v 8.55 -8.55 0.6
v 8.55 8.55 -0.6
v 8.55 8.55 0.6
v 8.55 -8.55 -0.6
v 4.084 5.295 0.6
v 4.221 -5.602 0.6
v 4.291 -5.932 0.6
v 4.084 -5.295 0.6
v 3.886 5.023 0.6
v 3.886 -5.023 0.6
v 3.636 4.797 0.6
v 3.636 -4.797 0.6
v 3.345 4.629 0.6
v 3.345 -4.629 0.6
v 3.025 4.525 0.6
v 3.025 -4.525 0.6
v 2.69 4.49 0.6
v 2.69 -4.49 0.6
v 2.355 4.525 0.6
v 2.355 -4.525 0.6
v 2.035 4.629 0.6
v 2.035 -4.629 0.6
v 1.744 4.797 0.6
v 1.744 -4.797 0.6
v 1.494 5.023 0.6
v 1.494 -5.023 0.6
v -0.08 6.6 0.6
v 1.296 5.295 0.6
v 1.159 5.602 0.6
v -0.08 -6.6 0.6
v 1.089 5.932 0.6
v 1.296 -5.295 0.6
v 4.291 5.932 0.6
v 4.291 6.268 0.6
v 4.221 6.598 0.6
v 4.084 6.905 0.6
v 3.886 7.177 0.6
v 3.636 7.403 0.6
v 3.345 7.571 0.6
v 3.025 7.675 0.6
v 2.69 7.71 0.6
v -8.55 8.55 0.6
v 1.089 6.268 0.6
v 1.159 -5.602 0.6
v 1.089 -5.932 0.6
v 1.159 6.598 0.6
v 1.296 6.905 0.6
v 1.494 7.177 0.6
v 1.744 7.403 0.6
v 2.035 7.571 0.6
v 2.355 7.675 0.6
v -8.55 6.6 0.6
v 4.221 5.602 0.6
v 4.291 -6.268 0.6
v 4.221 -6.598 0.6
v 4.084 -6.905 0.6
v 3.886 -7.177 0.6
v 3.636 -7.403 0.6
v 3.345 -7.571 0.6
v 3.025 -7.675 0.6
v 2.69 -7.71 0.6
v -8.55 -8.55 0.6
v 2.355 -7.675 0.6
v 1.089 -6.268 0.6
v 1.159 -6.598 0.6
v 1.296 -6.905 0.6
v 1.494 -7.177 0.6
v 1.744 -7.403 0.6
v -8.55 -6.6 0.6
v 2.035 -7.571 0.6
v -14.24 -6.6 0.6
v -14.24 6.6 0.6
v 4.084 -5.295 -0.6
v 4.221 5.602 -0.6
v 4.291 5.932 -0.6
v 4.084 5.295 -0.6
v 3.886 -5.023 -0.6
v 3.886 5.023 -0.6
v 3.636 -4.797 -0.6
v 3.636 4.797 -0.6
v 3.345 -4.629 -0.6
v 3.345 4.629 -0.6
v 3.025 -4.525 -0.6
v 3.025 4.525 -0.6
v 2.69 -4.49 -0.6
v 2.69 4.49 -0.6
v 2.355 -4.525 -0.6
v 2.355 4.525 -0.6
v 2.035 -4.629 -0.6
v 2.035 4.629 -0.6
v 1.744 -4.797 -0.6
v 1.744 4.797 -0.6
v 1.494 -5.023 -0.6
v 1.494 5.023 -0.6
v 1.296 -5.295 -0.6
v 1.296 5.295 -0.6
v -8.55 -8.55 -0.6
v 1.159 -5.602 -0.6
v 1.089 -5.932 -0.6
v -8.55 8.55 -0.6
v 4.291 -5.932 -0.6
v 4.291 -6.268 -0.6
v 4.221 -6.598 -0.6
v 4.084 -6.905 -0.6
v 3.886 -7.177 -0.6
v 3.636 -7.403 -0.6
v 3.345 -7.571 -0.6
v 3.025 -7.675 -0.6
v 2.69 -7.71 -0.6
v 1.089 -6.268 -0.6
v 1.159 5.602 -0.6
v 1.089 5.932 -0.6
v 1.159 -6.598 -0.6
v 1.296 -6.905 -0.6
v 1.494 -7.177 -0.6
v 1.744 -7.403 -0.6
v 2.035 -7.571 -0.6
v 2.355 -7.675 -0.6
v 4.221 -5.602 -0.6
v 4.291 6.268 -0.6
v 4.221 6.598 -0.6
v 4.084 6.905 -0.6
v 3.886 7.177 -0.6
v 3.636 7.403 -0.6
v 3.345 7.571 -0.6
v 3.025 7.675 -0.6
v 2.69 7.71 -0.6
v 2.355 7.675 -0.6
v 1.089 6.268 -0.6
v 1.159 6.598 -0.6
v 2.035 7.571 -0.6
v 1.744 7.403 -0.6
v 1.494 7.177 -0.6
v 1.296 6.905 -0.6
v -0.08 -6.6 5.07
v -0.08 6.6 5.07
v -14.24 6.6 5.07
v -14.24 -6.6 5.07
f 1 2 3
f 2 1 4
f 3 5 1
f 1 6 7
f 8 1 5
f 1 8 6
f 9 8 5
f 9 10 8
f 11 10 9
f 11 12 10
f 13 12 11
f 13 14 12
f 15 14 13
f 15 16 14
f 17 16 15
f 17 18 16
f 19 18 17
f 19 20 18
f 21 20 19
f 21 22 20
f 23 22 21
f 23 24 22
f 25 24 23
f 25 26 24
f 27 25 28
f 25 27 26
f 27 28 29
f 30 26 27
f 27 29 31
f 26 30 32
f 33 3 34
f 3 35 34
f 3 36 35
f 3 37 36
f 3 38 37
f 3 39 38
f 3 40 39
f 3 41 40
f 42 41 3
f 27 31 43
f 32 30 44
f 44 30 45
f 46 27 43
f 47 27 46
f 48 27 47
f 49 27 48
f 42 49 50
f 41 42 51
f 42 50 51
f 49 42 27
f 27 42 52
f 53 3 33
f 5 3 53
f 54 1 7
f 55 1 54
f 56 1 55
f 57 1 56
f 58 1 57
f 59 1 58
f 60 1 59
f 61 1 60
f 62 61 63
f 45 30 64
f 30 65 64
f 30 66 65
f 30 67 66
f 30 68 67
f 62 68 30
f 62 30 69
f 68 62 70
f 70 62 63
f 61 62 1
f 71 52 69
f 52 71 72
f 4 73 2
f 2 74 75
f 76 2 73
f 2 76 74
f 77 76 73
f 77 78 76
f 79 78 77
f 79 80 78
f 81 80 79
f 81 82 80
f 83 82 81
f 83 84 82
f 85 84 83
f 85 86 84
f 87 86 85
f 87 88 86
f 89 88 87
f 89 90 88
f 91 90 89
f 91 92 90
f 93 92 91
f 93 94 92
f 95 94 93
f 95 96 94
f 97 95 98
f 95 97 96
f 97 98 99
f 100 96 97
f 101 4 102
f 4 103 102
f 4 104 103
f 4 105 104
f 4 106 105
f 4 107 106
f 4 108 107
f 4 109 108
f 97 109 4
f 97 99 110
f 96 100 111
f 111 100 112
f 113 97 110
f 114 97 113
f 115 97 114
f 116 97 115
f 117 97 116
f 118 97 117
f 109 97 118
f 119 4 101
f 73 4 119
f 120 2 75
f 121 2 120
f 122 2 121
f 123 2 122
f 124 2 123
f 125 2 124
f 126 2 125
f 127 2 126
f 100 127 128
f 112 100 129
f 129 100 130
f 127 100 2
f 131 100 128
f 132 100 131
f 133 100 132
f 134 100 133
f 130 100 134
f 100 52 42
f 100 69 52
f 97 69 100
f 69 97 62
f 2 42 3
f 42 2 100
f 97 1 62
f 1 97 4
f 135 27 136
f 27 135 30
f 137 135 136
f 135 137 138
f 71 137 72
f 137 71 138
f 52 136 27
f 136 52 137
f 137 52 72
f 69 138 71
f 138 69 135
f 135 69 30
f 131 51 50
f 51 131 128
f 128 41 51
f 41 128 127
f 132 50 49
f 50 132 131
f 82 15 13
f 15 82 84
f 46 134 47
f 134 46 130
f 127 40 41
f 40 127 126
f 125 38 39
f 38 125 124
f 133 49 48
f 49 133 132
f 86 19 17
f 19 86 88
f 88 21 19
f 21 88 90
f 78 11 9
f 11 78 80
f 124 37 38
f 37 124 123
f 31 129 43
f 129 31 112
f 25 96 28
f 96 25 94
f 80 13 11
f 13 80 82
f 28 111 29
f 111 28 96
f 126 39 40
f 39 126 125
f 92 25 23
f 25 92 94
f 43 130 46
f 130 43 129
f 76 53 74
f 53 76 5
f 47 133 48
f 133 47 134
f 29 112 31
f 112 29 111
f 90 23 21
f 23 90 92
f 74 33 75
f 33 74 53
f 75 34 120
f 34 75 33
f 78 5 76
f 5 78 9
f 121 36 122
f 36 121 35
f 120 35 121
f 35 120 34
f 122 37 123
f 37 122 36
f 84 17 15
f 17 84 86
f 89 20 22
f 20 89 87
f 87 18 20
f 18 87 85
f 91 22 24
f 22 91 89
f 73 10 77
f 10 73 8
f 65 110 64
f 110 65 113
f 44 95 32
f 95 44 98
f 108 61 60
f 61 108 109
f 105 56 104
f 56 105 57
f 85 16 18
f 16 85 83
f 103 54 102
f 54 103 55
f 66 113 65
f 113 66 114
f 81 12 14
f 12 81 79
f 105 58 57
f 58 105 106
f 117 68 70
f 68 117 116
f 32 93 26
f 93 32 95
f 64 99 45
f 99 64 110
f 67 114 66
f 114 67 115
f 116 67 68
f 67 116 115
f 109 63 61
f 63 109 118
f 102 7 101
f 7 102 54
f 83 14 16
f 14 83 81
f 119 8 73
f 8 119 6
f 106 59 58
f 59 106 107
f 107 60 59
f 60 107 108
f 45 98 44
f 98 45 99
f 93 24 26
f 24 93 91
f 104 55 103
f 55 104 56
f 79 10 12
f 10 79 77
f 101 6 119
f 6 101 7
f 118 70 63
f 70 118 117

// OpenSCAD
// file: usb_BreakoutShared.scad
//
// USB A Male
//
AM_boardLength=15.1;
AM_boardWidth=15.1;
AM_boardHeigth=1.6;

AM_usbLength=18.7;
AM_usbWidth=12.3;
AM_usbHeigth=4.47;
AM_usbLengthOffset=3.25;
AM_usbHeigthOffset=AM_boardHeigth;

AM_boardBoltHoleDiamiter=3.22;
AM_boardBoltHoleSperation=9.8;
AM_boardBoltHoleFromEdge=1.3;
AM_boardBoltHoleFromBack=4.5;
//
// USB A Female
//
AF_boardLength=17.1;
AF_boardWidth=17.1;
AF_boardHeigth=1.2;

AF_usbLength=14.16;
AF_usbWidth=13.2;
AF_usbHeigth=4.47;
AF_usbLengthOffset=7.0;
AF_usbHeigthOffset=-AF_boardHeigth;

AF_boardBoltHoleDiamiter=3.22;
AF_boardBoltHoleSperation=12.2;
AF_boardBoltHoleFromEdge=1.3;
AF_boardBoltHoleFromBack=4.25;
//////////////////////////////////////
module boardMountingHoles(iHoleSperation,iHoleDiamiter,iZ){
  for(a=[1,-1]){
    translate([0,a*(iHoleSperation/2),0])
      color("silver")
      boardMountingHole(iHoleDiamiter,iZ);
  }
}
//////////////////////////////////////
module boardMountingHole(iHoleDiamiter,iZ){
  rotate([0,0,90])
    cylinder(d=iHoleDiamiter,h=iZ+1,center=true);
}
// main file
$fn=30;

include<usb_BreakoutShared.scad>;



AF_boardModel();

//////////////////////////////////////
module AF_boardModel(){
  difference(){
    union(){
// Circit Board
      color("LimeGreen")
      cube([AF_boardLength, AF_boardWidth, AF_boardHeigth],center=true);
//  USB Connector
      translate([-AF_usbLength+AF_usbLengthOffset,0,(AF_usbHeigth/2)-(AF_usbHeigthOffset/2)])
        color("silver")
        cube([AF_usbLength, AF_usbWidth, AF_usbHeigth],center=true);
    }
// Mounting Holes
    AF_boardMounts();
  }
}
//////////////////////////////////////
module AF_boardMounts(){
  translate([(AF_boardLength/2)-((AF_boardBoltHoleDiamiter/2)+AF_boardBoltHoleFromBack),0,0])
    boardMountingHoles(AF_boardBoltHoleSperation,AF_boardBoltHoleDiamiter,AF_boardHeigth); 
}
//////////////////////////////////////
//////////////////////////////////////
